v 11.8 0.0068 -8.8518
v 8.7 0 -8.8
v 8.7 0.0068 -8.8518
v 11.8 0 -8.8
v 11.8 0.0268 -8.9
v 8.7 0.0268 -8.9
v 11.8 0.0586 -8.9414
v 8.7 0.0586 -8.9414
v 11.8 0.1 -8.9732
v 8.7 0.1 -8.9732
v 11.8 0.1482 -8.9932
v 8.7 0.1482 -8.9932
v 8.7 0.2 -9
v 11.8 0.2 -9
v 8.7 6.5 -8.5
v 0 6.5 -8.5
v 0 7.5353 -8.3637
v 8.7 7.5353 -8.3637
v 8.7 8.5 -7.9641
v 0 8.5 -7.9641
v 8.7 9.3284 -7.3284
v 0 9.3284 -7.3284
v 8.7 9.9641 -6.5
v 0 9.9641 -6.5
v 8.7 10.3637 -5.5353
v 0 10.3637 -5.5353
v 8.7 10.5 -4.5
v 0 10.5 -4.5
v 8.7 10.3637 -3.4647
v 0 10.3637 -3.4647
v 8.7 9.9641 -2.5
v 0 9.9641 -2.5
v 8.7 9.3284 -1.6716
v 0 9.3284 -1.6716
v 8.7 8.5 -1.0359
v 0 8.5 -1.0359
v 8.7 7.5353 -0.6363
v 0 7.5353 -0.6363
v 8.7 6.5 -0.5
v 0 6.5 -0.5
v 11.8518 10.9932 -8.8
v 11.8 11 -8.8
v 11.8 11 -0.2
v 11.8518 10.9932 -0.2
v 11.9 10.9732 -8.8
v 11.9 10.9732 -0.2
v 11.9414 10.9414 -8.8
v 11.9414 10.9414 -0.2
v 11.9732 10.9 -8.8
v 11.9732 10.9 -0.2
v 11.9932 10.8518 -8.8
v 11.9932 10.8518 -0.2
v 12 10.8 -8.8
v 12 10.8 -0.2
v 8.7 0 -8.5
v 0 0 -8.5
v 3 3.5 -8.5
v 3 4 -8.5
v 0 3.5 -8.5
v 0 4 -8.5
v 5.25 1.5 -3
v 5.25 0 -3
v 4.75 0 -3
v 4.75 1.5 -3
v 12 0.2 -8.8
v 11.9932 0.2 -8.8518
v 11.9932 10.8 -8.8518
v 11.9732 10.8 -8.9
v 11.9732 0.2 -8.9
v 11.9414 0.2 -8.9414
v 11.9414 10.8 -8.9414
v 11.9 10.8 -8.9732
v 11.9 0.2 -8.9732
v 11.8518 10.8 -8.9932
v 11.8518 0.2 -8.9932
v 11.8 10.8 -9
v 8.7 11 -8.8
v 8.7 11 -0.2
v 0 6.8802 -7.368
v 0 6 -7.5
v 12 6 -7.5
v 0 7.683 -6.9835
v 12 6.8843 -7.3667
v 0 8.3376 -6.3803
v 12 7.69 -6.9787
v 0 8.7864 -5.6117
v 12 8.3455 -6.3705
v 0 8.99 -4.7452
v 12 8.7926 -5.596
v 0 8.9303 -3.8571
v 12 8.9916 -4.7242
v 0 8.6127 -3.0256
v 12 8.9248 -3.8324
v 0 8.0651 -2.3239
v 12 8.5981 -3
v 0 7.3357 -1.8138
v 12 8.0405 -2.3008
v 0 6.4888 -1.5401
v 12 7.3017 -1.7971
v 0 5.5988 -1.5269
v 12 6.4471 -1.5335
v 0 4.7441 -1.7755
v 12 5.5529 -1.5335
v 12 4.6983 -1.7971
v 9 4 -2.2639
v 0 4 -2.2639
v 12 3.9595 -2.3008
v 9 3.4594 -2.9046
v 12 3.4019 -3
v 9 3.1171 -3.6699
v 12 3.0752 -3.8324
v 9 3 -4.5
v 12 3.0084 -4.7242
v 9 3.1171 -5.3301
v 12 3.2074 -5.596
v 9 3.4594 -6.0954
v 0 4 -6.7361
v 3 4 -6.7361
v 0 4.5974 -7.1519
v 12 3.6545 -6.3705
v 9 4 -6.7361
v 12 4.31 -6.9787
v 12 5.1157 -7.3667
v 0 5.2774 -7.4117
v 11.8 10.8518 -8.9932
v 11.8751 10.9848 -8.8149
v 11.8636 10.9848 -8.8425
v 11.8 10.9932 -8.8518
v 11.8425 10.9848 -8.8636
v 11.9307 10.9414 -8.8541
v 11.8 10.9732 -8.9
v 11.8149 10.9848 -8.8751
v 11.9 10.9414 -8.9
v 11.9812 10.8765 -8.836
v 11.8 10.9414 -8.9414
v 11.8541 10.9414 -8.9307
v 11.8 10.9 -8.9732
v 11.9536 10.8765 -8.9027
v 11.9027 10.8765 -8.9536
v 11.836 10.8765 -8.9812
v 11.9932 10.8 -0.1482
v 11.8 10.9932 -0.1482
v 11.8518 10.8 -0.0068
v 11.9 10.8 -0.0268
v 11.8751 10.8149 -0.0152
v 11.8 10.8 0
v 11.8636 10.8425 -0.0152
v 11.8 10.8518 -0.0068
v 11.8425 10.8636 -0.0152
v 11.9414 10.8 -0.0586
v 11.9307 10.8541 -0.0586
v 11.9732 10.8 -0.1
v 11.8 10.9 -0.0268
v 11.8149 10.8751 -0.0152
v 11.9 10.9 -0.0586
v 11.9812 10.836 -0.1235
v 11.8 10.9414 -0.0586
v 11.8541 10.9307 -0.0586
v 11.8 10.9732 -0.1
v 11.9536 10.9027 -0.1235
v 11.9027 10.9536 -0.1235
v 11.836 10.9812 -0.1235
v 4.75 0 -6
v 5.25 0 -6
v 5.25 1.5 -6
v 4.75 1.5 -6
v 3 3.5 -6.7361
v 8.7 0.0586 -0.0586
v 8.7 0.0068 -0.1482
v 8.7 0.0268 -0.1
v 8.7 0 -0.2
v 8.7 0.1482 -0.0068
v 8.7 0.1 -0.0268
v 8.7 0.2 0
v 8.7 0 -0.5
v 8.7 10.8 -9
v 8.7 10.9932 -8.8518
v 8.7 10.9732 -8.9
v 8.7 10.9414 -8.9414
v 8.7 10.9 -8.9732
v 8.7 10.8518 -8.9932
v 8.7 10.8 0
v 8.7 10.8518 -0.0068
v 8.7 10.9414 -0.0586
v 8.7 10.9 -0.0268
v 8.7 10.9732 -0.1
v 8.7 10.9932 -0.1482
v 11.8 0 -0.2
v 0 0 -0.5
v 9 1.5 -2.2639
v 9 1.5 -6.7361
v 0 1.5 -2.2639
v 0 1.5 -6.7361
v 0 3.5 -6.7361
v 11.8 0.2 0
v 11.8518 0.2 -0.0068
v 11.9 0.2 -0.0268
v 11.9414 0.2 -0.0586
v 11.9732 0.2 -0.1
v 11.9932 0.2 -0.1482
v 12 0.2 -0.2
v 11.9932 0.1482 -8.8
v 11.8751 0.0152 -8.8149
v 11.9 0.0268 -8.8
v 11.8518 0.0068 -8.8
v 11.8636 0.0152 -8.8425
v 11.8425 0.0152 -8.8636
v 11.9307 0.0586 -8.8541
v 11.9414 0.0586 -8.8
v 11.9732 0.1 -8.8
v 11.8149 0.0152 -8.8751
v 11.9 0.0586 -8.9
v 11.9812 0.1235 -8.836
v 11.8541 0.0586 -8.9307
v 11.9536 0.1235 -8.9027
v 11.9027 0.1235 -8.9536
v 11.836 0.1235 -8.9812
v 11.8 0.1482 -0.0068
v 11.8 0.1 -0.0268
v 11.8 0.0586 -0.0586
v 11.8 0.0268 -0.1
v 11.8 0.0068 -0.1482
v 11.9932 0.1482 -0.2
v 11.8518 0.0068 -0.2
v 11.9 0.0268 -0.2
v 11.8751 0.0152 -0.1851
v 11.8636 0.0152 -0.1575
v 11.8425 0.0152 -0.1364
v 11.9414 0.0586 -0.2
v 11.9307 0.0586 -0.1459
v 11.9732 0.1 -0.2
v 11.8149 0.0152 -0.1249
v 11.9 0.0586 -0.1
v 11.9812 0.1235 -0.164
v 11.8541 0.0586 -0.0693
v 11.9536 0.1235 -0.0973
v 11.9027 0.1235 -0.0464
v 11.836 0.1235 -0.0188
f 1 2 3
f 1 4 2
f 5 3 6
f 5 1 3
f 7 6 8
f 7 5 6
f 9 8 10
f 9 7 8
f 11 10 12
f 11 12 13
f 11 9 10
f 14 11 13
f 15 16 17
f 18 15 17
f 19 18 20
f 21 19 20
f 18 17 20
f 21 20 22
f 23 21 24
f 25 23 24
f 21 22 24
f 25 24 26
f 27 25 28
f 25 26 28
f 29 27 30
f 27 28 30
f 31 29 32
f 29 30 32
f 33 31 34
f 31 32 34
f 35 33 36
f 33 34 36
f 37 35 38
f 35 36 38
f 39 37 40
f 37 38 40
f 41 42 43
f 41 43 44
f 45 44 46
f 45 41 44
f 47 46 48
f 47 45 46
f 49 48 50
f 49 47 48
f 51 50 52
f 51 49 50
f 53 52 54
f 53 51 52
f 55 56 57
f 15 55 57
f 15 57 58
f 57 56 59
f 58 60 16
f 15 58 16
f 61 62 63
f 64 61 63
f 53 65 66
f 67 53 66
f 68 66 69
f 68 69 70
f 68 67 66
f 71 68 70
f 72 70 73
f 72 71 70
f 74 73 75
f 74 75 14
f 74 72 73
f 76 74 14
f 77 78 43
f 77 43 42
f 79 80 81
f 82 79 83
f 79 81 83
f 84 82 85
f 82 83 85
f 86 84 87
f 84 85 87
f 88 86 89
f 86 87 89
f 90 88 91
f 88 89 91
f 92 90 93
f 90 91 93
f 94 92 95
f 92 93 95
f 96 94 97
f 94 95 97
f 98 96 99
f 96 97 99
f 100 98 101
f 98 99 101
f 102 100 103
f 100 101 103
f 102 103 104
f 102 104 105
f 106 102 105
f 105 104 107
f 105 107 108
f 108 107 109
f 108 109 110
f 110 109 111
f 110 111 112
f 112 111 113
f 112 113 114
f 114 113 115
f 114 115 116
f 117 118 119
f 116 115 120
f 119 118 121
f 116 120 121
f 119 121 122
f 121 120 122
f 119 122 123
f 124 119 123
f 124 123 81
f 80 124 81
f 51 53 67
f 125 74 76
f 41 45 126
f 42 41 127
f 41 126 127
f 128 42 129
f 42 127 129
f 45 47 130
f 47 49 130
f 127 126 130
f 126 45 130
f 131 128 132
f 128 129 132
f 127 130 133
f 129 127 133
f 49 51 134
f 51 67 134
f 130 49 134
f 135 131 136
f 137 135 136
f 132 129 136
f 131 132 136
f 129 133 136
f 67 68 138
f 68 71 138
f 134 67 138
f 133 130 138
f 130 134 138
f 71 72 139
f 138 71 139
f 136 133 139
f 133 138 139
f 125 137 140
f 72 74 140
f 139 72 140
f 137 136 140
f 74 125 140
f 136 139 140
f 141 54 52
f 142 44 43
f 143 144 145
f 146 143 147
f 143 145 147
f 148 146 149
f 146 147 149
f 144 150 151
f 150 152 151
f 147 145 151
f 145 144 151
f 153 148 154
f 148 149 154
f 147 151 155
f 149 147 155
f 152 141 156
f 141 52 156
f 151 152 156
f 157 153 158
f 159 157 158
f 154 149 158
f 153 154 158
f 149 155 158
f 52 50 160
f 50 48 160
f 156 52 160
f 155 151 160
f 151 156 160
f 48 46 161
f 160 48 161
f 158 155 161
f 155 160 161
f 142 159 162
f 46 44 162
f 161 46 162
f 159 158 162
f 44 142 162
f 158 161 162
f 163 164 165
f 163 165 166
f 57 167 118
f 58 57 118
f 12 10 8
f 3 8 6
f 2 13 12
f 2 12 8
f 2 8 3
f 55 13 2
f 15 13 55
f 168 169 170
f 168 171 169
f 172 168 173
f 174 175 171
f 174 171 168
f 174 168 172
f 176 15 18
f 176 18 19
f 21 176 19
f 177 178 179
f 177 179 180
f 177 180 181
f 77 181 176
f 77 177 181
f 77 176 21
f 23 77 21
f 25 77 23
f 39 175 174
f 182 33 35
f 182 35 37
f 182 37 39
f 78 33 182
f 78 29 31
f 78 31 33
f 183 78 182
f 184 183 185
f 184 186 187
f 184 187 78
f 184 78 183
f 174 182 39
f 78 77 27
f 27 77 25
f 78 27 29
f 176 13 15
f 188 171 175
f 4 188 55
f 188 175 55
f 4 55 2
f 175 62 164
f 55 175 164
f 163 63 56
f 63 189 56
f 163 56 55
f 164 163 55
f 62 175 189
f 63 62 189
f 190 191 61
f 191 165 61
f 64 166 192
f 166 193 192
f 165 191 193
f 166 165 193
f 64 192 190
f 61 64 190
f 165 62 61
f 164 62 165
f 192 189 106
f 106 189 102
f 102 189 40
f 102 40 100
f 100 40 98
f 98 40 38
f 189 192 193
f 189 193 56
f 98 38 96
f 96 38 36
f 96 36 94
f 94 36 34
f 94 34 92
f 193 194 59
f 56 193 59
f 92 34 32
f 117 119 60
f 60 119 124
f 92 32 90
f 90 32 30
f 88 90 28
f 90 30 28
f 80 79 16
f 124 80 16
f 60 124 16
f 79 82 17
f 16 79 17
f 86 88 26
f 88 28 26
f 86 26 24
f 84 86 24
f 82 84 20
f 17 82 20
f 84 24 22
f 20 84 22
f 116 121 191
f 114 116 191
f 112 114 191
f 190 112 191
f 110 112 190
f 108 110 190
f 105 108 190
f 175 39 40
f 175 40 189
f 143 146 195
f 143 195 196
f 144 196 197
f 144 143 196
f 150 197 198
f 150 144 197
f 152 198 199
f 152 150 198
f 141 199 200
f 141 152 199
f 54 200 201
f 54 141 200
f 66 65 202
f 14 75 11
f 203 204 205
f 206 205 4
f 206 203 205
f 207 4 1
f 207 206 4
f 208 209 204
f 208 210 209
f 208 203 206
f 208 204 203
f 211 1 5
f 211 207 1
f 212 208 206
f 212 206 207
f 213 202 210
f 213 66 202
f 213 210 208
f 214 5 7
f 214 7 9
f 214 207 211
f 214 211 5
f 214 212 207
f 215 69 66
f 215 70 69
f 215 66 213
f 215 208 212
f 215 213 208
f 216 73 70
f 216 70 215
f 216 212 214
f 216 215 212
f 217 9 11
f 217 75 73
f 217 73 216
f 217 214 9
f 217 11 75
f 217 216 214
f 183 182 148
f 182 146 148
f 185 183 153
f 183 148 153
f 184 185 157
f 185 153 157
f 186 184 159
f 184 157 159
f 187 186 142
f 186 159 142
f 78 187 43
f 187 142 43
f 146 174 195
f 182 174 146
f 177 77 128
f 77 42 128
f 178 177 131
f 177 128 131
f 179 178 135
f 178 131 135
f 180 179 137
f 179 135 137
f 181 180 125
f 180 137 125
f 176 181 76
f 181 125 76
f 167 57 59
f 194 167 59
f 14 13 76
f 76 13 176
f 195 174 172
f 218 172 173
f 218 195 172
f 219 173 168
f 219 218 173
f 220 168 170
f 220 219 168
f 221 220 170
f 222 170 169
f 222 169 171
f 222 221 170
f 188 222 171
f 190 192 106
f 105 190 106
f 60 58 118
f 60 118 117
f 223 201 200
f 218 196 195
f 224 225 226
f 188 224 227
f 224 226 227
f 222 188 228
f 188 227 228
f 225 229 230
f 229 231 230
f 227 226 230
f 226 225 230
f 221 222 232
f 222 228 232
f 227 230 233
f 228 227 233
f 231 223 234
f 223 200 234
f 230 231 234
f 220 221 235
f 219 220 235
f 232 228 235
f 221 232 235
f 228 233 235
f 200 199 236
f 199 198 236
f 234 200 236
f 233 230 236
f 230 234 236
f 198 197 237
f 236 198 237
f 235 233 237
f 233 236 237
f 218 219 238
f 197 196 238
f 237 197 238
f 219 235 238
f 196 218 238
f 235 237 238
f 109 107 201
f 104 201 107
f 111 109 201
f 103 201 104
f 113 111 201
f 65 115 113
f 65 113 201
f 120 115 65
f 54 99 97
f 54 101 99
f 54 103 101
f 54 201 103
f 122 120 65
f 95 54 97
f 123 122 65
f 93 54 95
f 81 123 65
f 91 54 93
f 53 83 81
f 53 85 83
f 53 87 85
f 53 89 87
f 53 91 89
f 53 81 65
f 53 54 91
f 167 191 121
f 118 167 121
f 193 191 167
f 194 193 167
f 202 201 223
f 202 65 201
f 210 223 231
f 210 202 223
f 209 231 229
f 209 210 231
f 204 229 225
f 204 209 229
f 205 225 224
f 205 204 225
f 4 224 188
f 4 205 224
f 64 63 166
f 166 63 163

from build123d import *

# Parameters (mm, degrees)
SKETCH1_W               = 9
SKETCH1_H               = 11
BOSS_EXTRUDE1_DEPTH     = 12
CUT_EXTRUDE1_DEPTH      = 1
CUT_EXTRUDE1_DEPTH_BACK = 8.7
SKETCH3_R               = 3
CUT_EXTRUDE2_DEPTH      = 13
CUT_EXTRUDE3_REACH      = 13
SKETCH4_W               = 0.5
SKETCH4_H               = 3
FILLET1_R               = 0.2
CUT_EXTRUDE4_REACH      = 10.5
SKETCH5_W               = 3
SKETCH5_H               = 0.5
SKETCH6_W               = 4.472135954
SKETCH6_H               = 2.5
CUT_EXTRUDE5_DEPTH      = 9


with BuildPart() as part:
    # Sketch1 → Boss-Extrude1 (new body)
    with BuildSketch(Plane(origin=(0, 0, 0), x_dir=(0, 0, -1), z_dir=(1, 0, 0))):
        with Locations((4.5, 5.5)):
            Rectangle(SKETCH1_W, SKETCH1_H)
    extrude(amount=BOSS_EXTRUDE1_DEPTH)

    # Sketch2 → Cut-Extrude1 (cut, two sides)
    with BuildSketch(Plane.ZY) as cut_extrude1_sk:
        with BuildLine():
            Line((-8.5, 0), (-8.5, 6.5))
            ThreePointArc((-8.5, 6.5), (-4.5, 10.5), (-0.5, 6.5))
            Line((-0.5, 6.5), (-0.5, 0))
            Line((-0.5, 0), (0, 0))
            Line((0, 0), (0, 11))
            Line((0, 11), (-9, 11))
            Line((-9, 11), (-9, 0))
            Line((-9, 0), (-8.5, 0))
        make_face()
    extrude(amount=CUT_EXTRUDE1_DEPTH, mode=Mode.SUBTRACT)
    extrude(cut_extrude1_sk.sketch, amount=-CUT_EXTRUDE1_DEPTH_BACK, mode=Mode.SUBTRACT)

    # Sketch3 → Cut-Extrude2 (cut, through all)
    with BuildSketch(Plane(origin=(12, 0, 0), x_dir=(0, 0, -1), z_dir=(1, 0, 0))):
        with Locations((4.5, 6)):
            Circle(SKETCH3_R)
    extrude(amount=-CUT_EXTRUDE2_DEPTH, mode=Mode.SUBTRACT)

    # Sketch4 → Cut-Extrude3 (cut, up to next)
    with BuildSketch(Plane(origin=(0, 0, 0), x_dir=(-1, 0, 0), z_dir=(0, -1, 0)), mode=Mode.PRIVATE) as cut_extrude3_sk1:
        with Locations((-5, 4.5)):
            Rectangle(SKETCH4_W, SKETCH4_H)
    cut_extrude3_tool1 = extrude(cut_extrude3_sk1.sketch, amount=-CUT_EXTRUDE3_REACH, mode=Mode.PRIVATE) & part.part
    add(cut_extrude3_tool1.solids().sort_by_distance((5, 0, -4.5))[0], mode=Mode.SUBTRACT)

    # Fillet1
    fillet1_edges = [part.edges().sort_by_distance(p)[0] for p in [
        (12, 5.5, -9),
        (12, 11, -4.5),
        (12, 5.5, 0),
        (12, 0, -4.5),
        (10.35, 11, 0),
        (10.35, 11, -9),
        (10.35, 0, -9),
        (10.35, 0, 0),
    ]]
    fillet(fillet1_edges, radius=FILLET1_R)

    # Sketch5 → Cut-Extrude4 (cut, up to next)
    with BuildSketch(Plane(origin=(0, 0, -8.5), x_dir=(-1, 0, 0), z_dir=(0, 0, -1)), mode=Mode.PRIVATE) as cut_extrude4_sk1:
        with Locations((-1.5, 3.75)):
            Rectangle(SKETCH5_W, SKETCH5_H)
    cut_extrude4_tool1 = extrude(cut_extrude4_sk1.sketch, amount=-CUT_EXTRUDE4_REACH, mode=Mode.PRIVATE) & part.part
    add(cut_extrude4_tool1.solids().sort_by_distance((1.5, 3.75, -8.5))[0], mode=Mode.SUBTRACT)

    # Sketch6 → Cut-Extrude5 (cut)
    with BuildSketch(Plane.ZY):
        with Locations((-4.5, 2.75)):
            Rectangle(SKETCH6_W, SKETCH6_H)
    extrude(amount=-CUT_EXTRUDE5_DEPTH, mode=Mode.SUBTRACT)


solid = part.part
